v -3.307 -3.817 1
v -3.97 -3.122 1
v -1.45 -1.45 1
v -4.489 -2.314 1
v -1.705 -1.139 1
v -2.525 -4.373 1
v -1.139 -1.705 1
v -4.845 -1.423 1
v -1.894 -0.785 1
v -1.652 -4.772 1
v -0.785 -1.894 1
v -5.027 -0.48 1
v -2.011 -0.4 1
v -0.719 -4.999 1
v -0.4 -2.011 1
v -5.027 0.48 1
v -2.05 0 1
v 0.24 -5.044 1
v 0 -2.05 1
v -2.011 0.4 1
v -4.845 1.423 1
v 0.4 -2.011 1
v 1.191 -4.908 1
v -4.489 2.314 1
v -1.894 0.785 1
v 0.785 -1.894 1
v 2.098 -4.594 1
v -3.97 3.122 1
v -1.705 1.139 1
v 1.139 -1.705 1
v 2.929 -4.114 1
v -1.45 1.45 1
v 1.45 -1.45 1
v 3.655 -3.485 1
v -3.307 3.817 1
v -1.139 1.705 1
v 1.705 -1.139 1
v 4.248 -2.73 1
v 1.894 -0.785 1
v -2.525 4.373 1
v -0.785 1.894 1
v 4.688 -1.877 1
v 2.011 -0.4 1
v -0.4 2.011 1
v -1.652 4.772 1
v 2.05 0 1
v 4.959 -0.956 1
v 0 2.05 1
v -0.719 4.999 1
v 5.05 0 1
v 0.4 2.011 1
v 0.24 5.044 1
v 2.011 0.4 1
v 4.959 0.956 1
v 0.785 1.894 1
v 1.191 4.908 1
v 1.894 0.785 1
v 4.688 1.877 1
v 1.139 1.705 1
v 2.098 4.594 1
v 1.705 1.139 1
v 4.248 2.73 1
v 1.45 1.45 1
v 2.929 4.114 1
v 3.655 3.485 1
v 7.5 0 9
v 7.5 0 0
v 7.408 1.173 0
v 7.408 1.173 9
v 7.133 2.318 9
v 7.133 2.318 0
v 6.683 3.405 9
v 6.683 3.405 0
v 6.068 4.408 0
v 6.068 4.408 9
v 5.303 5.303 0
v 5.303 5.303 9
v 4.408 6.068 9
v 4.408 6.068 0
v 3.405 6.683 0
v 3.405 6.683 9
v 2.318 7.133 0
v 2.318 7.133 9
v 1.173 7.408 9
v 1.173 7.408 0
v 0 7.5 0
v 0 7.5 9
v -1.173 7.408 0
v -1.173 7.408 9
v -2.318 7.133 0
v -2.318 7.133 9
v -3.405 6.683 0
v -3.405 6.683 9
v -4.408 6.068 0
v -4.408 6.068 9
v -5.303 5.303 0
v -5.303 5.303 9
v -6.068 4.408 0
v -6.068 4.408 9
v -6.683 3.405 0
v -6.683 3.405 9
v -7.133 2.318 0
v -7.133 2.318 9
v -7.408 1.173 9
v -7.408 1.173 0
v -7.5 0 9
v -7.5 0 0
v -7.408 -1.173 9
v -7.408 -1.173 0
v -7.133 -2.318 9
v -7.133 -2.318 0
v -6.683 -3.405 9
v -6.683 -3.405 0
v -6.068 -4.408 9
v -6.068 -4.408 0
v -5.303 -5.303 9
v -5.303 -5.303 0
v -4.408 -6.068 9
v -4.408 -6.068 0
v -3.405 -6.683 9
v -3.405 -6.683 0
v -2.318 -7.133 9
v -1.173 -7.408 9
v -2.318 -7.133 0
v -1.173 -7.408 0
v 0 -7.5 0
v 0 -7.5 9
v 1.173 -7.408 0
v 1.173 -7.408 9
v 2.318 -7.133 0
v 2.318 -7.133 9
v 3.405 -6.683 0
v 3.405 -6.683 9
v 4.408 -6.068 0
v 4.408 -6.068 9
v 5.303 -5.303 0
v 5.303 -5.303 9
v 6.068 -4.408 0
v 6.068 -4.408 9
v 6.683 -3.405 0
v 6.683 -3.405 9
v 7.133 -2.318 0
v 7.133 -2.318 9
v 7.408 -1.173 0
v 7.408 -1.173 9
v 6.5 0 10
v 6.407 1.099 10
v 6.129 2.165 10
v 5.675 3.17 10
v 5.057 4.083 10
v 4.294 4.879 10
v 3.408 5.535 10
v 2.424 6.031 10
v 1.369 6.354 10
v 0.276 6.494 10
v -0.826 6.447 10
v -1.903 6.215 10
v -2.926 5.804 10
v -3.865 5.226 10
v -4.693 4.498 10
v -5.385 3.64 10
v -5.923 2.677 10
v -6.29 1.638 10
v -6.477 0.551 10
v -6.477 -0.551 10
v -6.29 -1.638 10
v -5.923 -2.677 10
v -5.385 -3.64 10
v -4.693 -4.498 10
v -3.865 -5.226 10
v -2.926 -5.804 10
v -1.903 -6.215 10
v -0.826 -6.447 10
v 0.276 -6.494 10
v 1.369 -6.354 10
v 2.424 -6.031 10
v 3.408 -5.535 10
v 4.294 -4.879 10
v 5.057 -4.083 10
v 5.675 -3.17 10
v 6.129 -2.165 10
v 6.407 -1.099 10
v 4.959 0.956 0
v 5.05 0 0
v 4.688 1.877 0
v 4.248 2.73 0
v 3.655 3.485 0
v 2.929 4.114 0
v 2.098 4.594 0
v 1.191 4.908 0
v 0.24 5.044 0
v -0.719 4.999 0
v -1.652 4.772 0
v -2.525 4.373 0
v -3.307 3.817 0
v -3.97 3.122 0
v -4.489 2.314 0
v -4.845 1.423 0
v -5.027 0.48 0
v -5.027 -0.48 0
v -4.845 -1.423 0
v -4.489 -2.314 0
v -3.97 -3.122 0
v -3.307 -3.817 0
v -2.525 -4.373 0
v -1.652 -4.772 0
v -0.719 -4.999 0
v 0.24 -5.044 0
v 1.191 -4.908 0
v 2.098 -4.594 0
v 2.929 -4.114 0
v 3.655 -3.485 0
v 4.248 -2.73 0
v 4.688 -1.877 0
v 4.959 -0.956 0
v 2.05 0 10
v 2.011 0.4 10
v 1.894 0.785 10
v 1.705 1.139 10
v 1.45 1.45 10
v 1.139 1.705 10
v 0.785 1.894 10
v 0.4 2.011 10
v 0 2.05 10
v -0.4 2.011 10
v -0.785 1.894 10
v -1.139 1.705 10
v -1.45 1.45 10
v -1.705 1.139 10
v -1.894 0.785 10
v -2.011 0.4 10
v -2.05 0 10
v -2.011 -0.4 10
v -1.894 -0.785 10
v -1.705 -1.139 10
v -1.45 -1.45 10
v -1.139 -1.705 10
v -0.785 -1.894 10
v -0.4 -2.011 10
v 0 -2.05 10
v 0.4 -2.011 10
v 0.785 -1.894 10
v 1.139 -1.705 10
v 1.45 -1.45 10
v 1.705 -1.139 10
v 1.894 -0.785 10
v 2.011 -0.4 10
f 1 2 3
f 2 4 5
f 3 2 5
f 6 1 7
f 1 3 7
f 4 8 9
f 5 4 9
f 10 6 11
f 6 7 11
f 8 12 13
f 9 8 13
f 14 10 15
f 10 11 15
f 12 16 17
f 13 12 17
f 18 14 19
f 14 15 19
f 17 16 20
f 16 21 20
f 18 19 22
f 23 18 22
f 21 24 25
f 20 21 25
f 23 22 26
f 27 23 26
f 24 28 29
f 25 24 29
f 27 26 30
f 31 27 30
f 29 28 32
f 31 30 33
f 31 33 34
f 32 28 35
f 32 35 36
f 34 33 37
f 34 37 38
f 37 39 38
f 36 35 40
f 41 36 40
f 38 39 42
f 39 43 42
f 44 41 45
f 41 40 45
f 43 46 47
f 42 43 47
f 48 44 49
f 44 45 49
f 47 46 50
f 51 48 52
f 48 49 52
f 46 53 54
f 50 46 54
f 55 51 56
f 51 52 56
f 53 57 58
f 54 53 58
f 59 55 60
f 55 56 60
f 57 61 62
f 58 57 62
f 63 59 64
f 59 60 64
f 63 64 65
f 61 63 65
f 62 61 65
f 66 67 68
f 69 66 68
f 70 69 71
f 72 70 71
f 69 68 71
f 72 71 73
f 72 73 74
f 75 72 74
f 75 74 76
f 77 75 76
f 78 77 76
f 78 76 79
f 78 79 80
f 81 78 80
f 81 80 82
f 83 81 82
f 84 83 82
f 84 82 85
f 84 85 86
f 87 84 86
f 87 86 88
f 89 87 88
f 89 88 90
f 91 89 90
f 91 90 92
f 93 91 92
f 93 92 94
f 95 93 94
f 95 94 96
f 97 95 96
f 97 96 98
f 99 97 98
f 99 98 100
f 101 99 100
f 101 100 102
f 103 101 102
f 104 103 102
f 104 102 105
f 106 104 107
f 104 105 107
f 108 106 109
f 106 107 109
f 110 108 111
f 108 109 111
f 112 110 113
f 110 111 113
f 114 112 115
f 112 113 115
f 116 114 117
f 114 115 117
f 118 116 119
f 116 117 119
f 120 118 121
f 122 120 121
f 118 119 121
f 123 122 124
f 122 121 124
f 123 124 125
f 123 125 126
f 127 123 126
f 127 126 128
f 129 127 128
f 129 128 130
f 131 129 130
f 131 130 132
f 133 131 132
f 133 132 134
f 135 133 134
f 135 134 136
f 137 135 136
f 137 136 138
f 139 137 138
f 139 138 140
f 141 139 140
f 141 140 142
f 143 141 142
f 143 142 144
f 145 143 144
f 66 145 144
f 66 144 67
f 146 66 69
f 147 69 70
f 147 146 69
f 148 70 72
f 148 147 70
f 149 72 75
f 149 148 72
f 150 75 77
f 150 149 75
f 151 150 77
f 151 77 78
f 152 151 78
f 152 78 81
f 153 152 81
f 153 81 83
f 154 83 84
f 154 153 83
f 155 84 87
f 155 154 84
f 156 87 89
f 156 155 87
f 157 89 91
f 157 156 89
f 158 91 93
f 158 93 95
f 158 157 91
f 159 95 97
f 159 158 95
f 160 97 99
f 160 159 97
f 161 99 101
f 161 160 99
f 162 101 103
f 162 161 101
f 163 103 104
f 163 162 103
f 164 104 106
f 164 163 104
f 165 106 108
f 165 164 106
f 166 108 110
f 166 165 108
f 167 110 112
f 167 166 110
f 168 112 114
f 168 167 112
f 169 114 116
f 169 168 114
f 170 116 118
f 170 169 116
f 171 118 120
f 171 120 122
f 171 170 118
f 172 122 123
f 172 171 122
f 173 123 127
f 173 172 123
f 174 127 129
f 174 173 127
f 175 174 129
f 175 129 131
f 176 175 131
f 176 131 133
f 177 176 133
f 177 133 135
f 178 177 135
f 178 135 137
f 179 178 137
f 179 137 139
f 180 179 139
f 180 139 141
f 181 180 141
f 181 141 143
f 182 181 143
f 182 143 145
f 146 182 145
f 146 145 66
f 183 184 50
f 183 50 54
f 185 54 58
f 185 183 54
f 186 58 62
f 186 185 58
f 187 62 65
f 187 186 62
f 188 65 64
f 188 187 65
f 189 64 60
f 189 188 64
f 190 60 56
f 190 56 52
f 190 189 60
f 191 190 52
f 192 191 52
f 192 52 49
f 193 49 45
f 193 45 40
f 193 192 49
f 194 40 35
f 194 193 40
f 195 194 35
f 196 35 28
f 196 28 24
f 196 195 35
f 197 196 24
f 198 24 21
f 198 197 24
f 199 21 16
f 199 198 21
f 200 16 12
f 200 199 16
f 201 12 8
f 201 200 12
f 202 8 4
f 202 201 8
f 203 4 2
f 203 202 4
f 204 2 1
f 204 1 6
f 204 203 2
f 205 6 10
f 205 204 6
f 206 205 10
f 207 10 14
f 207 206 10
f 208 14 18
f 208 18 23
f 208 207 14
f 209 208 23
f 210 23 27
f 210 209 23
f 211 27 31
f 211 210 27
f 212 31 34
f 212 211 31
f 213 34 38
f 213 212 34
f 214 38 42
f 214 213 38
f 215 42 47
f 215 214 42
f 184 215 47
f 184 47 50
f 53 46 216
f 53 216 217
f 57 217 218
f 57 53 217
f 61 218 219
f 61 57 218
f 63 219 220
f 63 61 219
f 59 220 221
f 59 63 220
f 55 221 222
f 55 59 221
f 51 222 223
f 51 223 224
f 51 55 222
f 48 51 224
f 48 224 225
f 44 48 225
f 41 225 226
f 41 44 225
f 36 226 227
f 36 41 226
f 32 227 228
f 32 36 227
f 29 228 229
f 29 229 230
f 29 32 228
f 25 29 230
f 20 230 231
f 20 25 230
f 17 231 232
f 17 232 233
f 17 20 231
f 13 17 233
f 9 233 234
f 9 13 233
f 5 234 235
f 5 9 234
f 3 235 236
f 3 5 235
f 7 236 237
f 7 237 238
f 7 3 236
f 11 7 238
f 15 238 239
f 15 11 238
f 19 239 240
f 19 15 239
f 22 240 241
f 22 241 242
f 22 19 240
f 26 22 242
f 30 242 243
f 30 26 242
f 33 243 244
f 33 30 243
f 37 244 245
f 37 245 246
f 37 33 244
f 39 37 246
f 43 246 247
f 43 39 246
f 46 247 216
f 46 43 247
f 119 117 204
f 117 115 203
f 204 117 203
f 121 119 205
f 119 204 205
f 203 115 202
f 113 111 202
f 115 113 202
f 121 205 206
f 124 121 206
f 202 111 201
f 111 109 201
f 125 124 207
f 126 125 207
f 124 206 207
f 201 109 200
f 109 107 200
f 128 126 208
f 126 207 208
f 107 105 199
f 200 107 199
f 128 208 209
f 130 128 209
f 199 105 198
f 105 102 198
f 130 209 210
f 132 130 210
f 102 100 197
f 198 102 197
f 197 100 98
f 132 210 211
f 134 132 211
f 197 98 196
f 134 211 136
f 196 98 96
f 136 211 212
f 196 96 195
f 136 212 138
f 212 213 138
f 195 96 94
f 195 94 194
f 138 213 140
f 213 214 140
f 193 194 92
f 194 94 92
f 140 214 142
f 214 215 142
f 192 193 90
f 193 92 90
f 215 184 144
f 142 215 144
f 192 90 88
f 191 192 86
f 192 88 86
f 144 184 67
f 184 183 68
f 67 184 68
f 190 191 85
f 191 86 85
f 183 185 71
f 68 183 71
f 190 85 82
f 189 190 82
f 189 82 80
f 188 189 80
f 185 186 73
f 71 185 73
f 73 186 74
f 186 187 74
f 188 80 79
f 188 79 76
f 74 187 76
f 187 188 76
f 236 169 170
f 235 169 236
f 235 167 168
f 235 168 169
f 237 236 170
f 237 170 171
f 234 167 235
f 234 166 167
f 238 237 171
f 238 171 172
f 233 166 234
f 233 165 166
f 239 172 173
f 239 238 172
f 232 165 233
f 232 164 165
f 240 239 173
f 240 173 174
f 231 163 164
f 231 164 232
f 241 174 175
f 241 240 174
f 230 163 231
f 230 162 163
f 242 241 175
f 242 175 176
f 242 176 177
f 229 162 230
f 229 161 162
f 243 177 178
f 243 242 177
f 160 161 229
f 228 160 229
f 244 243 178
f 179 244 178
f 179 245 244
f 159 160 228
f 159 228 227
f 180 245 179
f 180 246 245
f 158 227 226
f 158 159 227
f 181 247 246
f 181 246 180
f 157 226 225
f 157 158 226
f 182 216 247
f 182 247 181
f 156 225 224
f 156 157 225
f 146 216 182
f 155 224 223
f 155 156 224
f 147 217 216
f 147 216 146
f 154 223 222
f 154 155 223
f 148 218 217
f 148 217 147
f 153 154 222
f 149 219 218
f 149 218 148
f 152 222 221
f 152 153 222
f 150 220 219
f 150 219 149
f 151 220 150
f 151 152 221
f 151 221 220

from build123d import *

# Parameters (mm, degrees)
ESQUISSE1_R        = 7.5
ESQUISSE1_R_2      = 5.05
BOSS_EXTRU_1_DEPTH = 1
ESQUISSE2_R        = 7.5
ESQUISSE2_R_2      = 2.05
BOSS_EXTRU_2_DEPTH = 9
CHANFREIN1_SIZE    = 1


with BuildPart() as part:
    # Esquisse1 → Boss.-Extru.1 (new body)
    with BuildSketch(Plane.XY):
        Circle(ESQUISSE1_R)
        Circle(ESQUISSE1_R_2, mode=Mode.SUBTRACT)
    extrude(amount=BOSS_EXTRU_1_DEPTH)

    # Esquisse2 → Boss.-Extru.2 (add)
    with BuildSketch(Plane.XY.offset(1)):
        Circle(ESQUISSE2_R)
        Circle(ESQUISSE2_R_2, mode=Mode.SUBTRACT)
    extrude(amount=BOSS_EXTRU_2_DEPTH)

    # Chanfrein1
    chanfrein1_edges = [part.edges().sort_by_distance(p)[0] for p in [
        (-7.5, 0, 10),
    ]]
    chamfer(chanfrein1_edges, length=CHANFREIN1_SIZE)


solid = part.part
